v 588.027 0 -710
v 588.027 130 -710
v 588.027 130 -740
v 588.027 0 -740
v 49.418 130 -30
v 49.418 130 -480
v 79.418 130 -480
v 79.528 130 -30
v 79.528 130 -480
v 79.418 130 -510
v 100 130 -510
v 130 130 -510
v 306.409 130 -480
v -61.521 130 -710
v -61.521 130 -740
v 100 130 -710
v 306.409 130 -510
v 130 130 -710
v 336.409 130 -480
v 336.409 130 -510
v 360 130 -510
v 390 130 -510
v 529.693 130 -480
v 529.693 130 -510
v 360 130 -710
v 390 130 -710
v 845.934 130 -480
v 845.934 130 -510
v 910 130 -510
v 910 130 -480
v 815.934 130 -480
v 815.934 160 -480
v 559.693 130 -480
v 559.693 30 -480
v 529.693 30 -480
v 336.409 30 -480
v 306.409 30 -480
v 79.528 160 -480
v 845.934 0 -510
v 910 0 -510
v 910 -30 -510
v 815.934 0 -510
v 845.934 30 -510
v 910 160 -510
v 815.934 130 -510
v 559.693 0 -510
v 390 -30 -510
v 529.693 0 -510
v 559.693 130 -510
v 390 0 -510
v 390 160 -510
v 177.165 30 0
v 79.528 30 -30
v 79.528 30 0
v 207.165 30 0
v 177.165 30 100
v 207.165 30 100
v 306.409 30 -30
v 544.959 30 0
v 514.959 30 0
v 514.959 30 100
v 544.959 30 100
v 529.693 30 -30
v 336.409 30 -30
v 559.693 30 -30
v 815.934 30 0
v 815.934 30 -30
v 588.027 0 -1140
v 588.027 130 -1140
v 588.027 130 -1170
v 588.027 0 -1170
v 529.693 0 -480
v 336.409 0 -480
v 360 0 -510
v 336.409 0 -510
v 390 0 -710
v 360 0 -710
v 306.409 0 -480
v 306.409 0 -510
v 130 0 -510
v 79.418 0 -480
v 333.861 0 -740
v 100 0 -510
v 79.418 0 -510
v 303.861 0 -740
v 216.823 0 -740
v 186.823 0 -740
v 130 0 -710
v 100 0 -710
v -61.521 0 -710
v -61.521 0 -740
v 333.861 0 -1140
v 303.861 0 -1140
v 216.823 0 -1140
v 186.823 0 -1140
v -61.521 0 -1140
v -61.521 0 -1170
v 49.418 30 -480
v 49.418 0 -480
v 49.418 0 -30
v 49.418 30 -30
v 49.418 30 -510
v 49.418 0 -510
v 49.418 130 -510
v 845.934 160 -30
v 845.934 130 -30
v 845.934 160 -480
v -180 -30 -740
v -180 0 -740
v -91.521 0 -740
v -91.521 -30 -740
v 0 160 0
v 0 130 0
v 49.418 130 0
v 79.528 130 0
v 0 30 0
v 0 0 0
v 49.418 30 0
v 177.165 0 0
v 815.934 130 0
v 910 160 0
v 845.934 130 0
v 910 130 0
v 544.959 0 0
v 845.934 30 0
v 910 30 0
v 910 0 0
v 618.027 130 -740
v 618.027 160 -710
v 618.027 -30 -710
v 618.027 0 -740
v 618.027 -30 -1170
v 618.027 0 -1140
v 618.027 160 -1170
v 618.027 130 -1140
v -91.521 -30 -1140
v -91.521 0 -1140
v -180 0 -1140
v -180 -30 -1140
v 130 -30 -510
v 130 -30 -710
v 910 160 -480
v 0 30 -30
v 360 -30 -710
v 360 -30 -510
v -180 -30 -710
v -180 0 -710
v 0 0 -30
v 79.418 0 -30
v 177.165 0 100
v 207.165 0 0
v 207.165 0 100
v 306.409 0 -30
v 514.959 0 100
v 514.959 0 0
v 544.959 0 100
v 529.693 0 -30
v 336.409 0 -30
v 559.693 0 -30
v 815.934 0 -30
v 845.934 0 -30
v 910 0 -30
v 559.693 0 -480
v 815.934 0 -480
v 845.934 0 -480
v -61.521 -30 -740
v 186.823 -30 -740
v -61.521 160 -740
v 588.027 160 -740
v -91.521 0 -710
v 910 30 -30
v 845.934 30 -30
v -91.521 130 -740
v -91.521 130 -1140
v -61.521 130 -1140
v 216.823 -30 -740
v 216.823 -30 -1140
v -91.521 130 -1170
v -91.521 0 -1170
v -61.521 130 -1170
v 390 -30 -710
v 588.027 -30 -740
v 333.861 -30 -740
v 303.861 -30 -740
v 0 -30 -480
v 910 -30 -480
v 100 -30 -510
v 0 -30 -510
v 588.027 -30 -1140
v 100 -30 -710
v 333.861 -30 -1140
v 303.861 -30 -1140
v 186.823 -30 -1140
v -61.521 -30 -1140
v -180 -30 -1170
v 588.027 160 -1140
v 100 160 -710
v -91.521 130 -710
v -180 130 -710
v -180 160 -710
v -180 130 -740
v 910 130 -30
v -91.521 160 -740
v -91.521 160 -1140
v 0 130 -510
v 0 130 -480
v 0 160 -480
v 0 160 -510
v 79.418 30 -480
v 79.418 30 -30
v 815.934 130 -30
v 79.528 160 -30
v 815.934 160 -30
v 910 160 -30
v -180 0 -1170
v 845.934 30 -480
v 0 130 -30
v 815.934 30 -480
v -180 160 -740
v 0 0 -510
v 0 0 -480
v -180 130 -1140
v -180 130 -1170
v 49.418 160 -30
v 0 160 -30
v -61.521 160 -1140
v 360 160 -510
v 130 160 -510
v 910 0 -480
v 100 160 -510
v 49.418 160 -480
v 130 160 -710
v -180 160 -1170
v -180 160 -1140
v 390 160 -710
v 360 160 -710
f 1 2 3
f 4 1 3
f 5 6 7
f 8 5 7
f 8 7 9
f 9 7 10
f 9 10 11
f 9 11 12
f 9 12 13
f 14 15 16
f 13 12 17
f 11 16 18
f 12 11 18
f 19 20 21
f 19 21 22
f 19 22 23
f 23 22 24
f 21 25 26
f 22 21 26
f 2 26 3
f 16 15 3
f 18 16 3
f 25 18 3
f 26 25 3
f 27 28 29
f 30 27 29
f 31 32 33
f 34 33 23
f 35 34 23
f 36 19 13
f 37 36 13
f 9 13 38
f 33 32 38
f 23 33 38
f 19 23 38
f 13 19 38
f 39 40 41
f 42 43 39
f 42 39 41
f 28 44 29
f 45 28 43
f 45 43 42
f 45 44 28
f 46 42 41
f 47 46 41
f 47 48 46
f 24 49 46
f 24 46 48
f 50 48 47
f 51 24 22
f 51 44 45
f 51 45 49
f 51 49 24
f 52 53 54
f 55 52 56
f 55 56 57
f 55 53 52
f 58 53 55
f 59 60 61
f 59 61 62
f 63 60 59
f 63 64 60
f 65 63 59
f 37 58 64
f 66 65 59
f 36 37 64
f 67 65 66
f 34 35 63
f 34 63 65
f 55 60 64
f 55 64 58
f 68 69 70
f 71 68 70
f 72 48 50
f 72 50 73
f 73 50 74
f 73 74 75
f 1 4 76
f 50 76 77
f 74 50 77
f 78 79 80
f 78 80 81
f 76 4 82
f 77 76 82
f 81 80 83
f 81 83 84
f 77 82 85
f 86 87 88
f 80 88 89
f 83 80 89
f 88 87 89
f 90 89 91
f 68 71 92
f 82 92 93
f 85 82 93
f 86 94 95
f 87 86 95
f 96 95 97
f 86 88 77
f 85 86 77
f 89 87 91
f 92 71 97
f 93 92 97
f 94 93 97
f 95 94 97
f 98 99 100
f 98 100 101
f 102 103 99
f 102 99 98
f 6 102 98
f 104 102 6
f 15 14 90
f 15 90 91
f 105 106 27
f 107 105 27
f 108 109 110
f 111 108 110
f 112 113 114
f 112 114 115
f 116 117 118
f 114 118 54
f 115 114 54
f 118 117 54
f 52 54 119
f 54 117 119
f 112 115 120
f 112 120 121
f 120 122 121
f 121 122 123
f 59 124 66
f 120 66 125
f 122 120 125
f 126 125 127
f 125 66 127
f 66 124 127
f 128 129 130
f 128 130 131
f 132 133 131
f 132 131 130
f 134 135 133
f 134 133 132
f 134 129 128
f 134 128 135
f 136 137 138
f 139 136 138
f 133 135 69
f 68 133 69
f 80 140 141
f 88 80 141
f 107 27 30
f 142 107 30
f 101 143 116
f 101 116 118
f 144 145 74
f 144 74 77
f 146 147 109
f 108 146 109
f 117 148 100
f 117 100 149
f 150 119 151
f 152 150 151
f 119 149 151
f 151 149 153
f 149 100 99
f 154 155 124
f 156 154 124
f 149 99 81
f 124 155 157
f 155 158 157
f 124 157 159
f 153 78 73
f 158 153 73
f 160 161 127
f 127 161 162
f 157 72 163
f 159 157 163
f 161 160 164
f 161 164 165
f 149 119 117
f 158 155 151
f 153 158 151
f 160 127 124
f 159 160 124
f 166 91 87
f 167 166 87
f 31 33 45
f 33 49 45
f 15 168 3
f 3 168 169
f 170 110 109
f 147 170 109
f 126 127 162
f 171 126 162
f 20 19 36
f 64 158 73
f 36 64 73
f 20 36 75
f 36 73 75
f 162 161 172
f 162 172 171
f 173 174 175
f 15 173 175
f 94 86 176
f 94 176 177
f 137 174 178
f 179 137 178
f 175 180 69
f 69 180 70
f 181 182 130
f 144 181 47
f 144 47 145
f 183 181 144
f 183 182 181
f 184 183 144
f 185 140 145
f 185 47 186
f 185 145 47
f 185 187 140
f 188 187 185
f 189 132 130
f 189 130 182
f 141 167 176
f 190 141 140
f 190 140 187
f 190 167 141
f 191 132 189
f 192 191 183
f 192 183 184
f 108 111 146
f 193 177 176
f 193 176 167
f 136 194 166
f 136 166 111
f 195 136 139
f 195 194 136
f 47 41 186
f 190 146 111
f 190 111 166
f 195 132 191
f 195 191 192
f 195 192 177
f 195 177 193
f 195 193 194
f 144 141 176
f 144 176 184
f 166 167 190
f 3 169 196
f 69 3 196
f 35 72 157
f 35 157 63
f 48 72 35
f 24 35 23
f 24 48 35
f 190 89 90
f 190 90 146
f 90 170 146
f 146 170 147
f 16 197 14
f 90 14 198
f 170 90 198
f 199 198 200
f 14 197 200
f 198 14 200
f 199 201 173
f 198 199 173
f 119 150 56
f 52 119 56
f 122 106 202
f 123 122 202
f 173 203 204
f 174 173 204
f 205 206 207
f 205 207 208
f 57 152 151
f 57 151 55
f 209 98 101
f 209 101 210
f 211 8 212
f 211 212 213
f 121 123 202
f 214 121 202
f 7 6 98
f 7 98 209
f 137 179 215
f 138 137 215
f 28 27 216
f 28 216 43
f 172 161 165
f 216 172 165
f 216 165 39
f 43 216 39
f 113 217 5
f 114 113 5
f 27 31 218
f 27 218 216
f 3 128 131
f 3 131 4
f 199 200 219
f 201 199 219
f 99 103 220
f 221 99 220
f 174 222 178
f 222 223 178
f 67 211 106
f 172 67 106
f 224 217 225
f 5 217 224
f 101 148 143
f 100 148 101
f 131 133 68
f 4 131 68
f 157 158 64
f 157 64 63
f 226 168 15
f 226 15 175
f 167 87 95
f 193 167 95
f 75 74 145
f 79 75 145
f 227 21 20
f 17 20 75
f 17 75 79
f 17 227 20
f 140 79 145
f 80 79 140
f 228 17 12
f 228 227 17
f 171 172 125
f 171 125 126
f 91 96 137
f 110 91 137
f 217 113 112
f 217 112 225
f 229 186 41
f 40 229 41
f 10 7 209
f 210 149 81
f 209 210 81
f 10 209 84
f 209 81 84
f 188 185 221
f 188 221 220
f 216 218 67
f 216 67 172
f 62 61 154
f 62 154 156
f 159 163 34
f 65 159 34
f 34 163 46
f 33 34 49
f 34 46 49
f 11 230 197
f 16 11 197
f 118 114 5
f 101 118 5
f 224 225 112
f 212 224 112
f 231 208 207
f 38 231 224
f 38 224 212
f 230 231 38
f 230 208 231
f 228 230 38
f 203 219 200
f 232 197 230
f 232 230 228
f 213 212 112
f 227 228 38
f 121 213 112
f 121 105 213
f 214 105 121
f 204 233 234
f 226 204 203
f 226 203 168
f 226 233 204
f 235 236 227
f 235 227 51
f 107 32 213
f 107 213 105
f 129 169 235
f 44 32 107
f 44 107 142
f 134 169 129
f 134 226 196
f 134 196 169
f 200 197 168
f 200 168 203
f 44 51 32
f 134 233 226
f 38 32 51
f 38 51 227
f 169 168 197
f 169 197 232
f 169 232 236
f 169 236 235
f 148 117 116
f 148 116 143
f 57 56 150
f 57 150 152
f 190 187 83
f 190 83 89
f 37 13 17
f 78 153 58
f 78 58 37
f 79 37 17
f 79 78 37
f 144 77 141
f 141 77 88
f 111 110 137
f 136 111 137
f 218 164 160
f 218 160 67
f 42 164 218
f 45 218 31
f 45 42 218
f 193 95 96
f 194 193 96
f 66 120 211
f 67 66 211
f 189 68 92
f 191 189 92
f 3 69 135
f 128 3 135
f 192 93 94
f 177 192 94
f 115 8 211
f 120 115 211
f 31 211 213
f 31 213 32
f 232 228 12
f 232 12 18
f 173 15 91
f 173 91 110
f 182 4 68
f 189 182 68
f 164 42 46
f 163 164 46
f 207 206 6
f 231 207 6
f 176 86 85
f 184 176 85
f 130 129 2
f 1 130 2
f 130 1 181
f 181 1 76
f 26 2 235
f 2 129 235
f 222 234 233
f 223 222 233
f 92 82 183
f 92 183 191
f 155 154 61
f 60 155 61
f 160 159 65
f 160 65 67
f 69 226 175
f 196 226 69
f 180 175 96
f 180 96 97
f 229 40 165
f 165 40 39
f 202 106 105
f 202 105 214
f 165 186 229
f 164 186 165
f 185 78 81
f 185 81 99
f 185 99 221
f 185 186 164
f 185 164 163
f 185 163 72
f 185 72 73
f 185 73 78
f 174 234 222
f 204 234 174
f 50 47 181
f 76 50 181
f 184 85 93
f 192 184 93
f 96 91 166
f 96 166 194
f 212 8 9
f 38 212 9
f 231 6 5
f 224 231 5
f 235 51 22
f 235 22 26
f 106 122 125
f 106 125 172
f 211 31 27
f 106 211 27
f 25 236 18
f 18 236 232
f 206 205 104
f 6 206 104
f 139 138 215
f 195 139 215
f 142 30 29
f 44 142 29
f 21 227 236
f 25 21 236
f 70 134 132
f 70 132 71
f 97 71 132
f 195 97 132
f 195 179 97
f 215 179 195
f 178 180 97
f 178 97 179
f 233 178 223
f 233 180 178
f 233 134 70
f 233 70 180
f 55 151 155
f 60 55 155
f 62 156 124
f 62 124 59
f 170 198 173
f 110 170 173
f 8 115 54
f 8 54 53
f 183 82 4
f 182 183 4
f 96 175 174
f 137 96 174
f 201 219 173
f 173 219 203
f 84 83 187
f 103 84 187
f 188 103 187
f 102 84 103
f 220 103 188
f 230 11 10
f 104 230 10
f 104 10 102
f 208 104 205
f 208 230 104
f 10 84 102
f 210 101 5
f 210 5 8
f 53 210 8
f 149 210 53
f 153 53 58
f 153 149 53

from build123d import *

# Parameters (mm, degrees)
SKETCH_1_W          = 30
SKETCH_1_H          = 450
SKETCH_1_W_2        = 910
SKETCH_1_H_2        = 30
EXTRUDE_1_DEPTH     = 30
SKETCH_2_W          = 30.109824799
SKETCH_2_H          = 30
SKETCH_2_W_2        = 30
EXTRUDE_2_DEPTH     = 100
SKETCH_3_W          = 49.418401049
SKETCH_3_H          = 30
SKETCH_3_W_2        = 30
SKETCH_3_W_3        = 910
SKETCH_3_H_2        = 450
EXTRUDE_3_DEPTH     = 30
SKETCH_4_W          = 850
SKETCH_4_H          = 30
SKETCH_4_W_2        = 30
SKETCH_4_H_2        = 400
EXTRUDE_4_DEPTH     = 30
SKETCH_5_W          = 30
SKETCH_5_H          = 30
EXTRUDE_5_DEPTH     = 130
SKETCH_6_W          = 88.479210194
SKETCH_6_H          = 30
SKETCH_6_W_2        = 30
SKETCH_6_H_2        = 400
SKETCH_6_W_3        = 850
EXTRUDE_6_DEPTH     = 30
SKETCH_8_W          = 736.515263892
SKETCH_8_H          = 30
SKETCH_8_W_2        = 64.066335059
SKETCH_8_W_3        = 49.418401049
CUT_EXTRUDE_2_DEPTH = 30
SKETCH_9_W          = 910
SKETCH_9_H          = 30
EXTRUDE_7_DEPTH     = 30
SKETCH_12_W         = 30
SKETCH_12_H         = 130
EXTRUDE_8_DEPTH     = 30
SKETCH_13_W         = 30
SKETCH_13_H         = 200
EXTRUDE_9_DEPTH     = 30
SKETCH_14_W         = 30
SKETCH_14_H         = 200
EXTRUDE_10_DEPTH    = 30
SKETCH_15_W         = 489.531957018
SKETCH_15_H         = 254.722560686
CUT_EXTRUDE_3_DEPTH = 51.972649134
SKETCH_16_W         = 30
SKETCH_16_H         = 30
EXTRUDE_11_DEPTH    = 100


with BuildPart() as part:
    # 草图1 → 凸台-拉伸1 (new body)
    with BuildSketch(Plane(origin=(0, 0, 0), x_dir=(1, 0, 0), z_dir=(0, 1, 0))):
        with Locations((64.418401049, 255)):
            Rectangle(SKETCH_1_W, SKETCH_1_H)
        with Locations((455, 15)):
            Rectangle(SKETCH_1_W_2, SKETCH_1_H_2)
        with Locations((321.408548695, 255)):
            Rectangle(SKETCH_1_W, SKETCH_1_H)
        with Locations((544.693031268, 255)):
            Rectangle(SKETCH_1_W, SKETCH_1_H)
        with Locations((830.933664941, 255)):
            Rectangle(SKETCH_1_W, SKETCH_1_H)
        Polygon((0, 480), (49.418401049, 480), (79.418401049, 480), (306.408548695, 480), (336.408548695, 480), (529.693031268, 480), (559.693031268, 480), (815.933664941, 480), (845.933664941, 480), (910, 480), (910, 510), (0, 510), align=None)
    extrude(amount=EXTRUDE_1_DEPTH)

    # 草图2 → 凸台-拉伸2 (add)
    with BuildSketch(Plane(origin=(0, 30, 0), x_dir=(1, 0, 0), z_dir=(0, 1, 0))):
        with Locations((64.473313449, 15)):
            Rectangle(SKETCH_2_W, SKETCH_2_H)
        with Locations((830.933664941, 15)):
            Rectangle(SKETCH_2_W_2, SKETCH_2_H)
        with Locations((64.418401049, 495)):
            Rectangle(SKETCH_2_W_2, SKETCH_2_H)
        with Locations((830.933664941, 495)):
            Rectangle(SKETCH_2_W_2, SKETCH_2_H)
    extrude(amount=EXTRUDE_2_DEPTH)

    # 草图3 → 凸台-拉伸3 (add)
    with BuildSketch(Plane(origin=(0, 130, 0), x_dir=(1, 0, 0), z_dir=(0, 1, 0))):
        Polygon((910, 510), (79.418401049, 510), (79.418401049, 480), (79.528225848, 480), (815.933664941, 480), (845.933664941, 480), (910, 480), align=None)
        with Locations((24.709200525, 495)):
            Rectangle(SKETCH_3_W, SKETCH_3_H)
        with Locations((64.418401049, 495)):
            Rectangle(SKETCH_3_W_2, SKETCH_3_H)
        with Locations((455, 15)):
            Rectangle(SKETCH_3_W_3, SKETCH_3_H)
        Polygon((79.418401049, 480), (49.418401049, 480), (49.418401049, 30), (79.528225848, 30), (79.528225848, 480), align=None)
        with Locations((830.933664941, 255)):
            Rectangle(SKETCH_3_W_2, SKETCH_3_H_2)
    extrude(amount=EXTRUDE_3_DEPTH)

    # 草图8 → 切除-拉伸2 (cut)
    with BuildSketch(Plane(origin=(0, 0, -510), x_dir=(-1, 0, 0), z_dir=(0, 0, -1))):
        with Locations((-447.676032995, 15)):
            Rectangle(SKETCH_8_W, SKETCH_8_H)
        with Locations((-877.966832471, 15)):
            Rectangle(SKETCH_8_W_2, SKETCH_8_H)
        with Locations((-24.709200525, 15)):
            Rectangle(SKETCH_8_W_3, SKETCH_8_H)
    extrude(amount=-CUT_EXTRUDE_2_DEPTH, mode=Mode.SUBTRACT)



with BuildPart() as body_2:
    # 草图4 → 凸台-拉伸4 (new body)
    with BuildSketch(Plane(origin=(0, 160, 0), x_dir=(1, 0, 0), z_dir=(0, 1, 0))):
        with Locations((245, 725)):
            Rectangle(SKETCH_4_W, SKETCH_4_H)
        with Locations((245, 1155)):
            Rectangle(SKETCH_4_W, SKETCH_4_H)
        with Locations((-76.520789806, 940)):
            Rectangle(SKETCH_4_W_2, SKETCH_4_H_2)
        with Locations((603.027350866, 940)):
            Rectangle(SKETCH_4_W_2, SKETCH_4_H_2)
    extrude(amount=-EXTRUDE_4_DEPTH)

    # 草图5 → 凸台-拉伸5 (add)
    with BuildSketch(Plane(origin=(0, 130, 0), x_dir=(-1, 0, 0), z_dir=(0, -1, 0))):
        with Locations((76.520789806, 725)):
            Rectangle(SKETCH_5_W, SKETCH_5_H)
        with Locations((-603.027350866, 725)):
            Rectangle(SKETCH_5_W, SKETCH_5_H)
        with Locations((-603.027350866, 1155)):
            Rectangle(SKETCH_5_W, SKETCH_5_H)
        with Locations((76.520789806, 1155)):
            Rectangle(SKETCH_5_W, SKETCH_5_H)
    extrude(amount=EXTRUDE_5_DEPTH)

    # 草图6 → 凸台-拉伸6 (add)
    with BuildSketch(Plane(origin=(0, 0, 0), x_dir=(-1, 0, 0), z_dir=(0, -1, 0))):
        Polygon((-670, 710), (61.520789806, 710), (61.520789806, 740), (-186.822629959, 740), (-216.822629959, 740), (-303.86127731, 740), (-333.86127731, 740), (-588.027350866, 740), (-618.027350866, 740), (-670, 740), align=None)
        with Locations((135.760394903, 725)):
            Rectangle(SKETCH_6_W, SKETCH_6_H)
        with Locations((76.520789806, 725)):
            Rectangle(SKETCH_6_W_2, SKETCH_6_H)
        with Locations((76.520789806, 940)):
            Rectangle(SKETCH_6_W_2, SKETCH_6_H_2)
        with Locations((-201.822629959, 940)):
            Rectangle(SKETCH_6_W_2, SKETCH_6_H_2)
        with Locations((-318.86127731, 940)):
            Rectangle(SKETCH_6_W_2, SKETCH_6_H_2)
        with Locations((-603.027350866, 940)):
            Rectangle(SKETCH_6_W_2, SKETCH_6_H_2)
        with Locations((-245, 1155)):
            Rectangle(SKETCH_6_W_3, SKETCH_6_H)
    extrude(amount=EXTRUDE_6_DEPTH)


with BuildPart() as body_3:
    # 草图9 → 凸台-拉伸7 (new body)
    with BuildSketch(Plane(origin=(0, -30, 0), x_dir=(-1, 0, 0), z_dir=(0, -1, 0))):
        with Locations((-455, 495)):
            Rectangle(SKETCH_9_W, SKETCH_9_H)
    extrude(amount=-EXTRUDE_7_DEPTH)


with BuildPart() as part_1:
    add(part.part)

    add(body_3.part)  # 凸台-拉伸8 merges body 3
    # 草图12 → 凸台-拉伸8 (add)
    with BuildSketch(Plane(origin=(0, 0, -510), x_dir=(-1, 0, 0), z_dir=(0, 0, -1))):
        with Locations((-544.693031268, 65)):
            Rectangle(SKETCH_12_W, SKETCH_12_H)
        with Locations((-321.408548695, 65)):
            Rectangle(SKETCH_12_W, SKETCH_12_H)
    extrude(amount=-EXTRUDE_8_DEPTH)


    add(body_2.part)  # 凸台-拉伸9 merges body 2
    # 草图13 → 凸台-拉伸9 (add)
    with BuildSketch(Plane(origin=(0, -30, 0), x_dir=(-1, 0, 0), z_dir=(0, -1, 0))):
        with Locations((-115, 610)):
            Rectangle(SKETCH_13_W, SKETCH_13_H)
        with Locations((-375, 610)):
            Rectangle(SKETCH_13_W, SKETCH_13_H)
    extrude(amount=-EXTRUDE_9_DEPTH)

    # 草图14 → 凸台-拉伸10 (add)
    with BuildSketch(Plane(origin=(0, 160, 0), x_dir=(1, 0, 0), z_dir=(0, 1, 0))):
        with Locations((115, 610)):
            Rectangle(SKETCH_14_W, SKETCH_14_H)
        with Locations((375, 610)):
            Rectangle(SKETCH_14_W, SKETCH_14_H)
    extrude(amount=-EXTRUDE_10_DEPTH)

    # 草图15 → 切除-拉伸3 (cut)
    with BuildSketch(Plane(origin=(670, 0, 0), x_dir=(0, 0, -1), z_dir=(1, 0, 0))):
        with Locations((948.415249447, 56.198014116)):
            Rectangle(SKETCH_15_W, SKETCH_15_H)
    extrude(amount=-CUT_EXTRUDE_3_DEPTH, mode=Mode.SUBTRACT)

    # 草图16 → 凸台-拉伸11 (add)
    with BuildSketch(Plane.XY):
        with Locations((192.165247783, 15)):
            Rectangle(SKETCH_16_W, SKETCH_16_H)
        with Locations((529.958608766, 15)):
            Rectangle(SKETCH_16_W, SKETCH_16_H)
    extrude(amount=EXTRUDE_11_DEPTH)


solid = part_1.part
